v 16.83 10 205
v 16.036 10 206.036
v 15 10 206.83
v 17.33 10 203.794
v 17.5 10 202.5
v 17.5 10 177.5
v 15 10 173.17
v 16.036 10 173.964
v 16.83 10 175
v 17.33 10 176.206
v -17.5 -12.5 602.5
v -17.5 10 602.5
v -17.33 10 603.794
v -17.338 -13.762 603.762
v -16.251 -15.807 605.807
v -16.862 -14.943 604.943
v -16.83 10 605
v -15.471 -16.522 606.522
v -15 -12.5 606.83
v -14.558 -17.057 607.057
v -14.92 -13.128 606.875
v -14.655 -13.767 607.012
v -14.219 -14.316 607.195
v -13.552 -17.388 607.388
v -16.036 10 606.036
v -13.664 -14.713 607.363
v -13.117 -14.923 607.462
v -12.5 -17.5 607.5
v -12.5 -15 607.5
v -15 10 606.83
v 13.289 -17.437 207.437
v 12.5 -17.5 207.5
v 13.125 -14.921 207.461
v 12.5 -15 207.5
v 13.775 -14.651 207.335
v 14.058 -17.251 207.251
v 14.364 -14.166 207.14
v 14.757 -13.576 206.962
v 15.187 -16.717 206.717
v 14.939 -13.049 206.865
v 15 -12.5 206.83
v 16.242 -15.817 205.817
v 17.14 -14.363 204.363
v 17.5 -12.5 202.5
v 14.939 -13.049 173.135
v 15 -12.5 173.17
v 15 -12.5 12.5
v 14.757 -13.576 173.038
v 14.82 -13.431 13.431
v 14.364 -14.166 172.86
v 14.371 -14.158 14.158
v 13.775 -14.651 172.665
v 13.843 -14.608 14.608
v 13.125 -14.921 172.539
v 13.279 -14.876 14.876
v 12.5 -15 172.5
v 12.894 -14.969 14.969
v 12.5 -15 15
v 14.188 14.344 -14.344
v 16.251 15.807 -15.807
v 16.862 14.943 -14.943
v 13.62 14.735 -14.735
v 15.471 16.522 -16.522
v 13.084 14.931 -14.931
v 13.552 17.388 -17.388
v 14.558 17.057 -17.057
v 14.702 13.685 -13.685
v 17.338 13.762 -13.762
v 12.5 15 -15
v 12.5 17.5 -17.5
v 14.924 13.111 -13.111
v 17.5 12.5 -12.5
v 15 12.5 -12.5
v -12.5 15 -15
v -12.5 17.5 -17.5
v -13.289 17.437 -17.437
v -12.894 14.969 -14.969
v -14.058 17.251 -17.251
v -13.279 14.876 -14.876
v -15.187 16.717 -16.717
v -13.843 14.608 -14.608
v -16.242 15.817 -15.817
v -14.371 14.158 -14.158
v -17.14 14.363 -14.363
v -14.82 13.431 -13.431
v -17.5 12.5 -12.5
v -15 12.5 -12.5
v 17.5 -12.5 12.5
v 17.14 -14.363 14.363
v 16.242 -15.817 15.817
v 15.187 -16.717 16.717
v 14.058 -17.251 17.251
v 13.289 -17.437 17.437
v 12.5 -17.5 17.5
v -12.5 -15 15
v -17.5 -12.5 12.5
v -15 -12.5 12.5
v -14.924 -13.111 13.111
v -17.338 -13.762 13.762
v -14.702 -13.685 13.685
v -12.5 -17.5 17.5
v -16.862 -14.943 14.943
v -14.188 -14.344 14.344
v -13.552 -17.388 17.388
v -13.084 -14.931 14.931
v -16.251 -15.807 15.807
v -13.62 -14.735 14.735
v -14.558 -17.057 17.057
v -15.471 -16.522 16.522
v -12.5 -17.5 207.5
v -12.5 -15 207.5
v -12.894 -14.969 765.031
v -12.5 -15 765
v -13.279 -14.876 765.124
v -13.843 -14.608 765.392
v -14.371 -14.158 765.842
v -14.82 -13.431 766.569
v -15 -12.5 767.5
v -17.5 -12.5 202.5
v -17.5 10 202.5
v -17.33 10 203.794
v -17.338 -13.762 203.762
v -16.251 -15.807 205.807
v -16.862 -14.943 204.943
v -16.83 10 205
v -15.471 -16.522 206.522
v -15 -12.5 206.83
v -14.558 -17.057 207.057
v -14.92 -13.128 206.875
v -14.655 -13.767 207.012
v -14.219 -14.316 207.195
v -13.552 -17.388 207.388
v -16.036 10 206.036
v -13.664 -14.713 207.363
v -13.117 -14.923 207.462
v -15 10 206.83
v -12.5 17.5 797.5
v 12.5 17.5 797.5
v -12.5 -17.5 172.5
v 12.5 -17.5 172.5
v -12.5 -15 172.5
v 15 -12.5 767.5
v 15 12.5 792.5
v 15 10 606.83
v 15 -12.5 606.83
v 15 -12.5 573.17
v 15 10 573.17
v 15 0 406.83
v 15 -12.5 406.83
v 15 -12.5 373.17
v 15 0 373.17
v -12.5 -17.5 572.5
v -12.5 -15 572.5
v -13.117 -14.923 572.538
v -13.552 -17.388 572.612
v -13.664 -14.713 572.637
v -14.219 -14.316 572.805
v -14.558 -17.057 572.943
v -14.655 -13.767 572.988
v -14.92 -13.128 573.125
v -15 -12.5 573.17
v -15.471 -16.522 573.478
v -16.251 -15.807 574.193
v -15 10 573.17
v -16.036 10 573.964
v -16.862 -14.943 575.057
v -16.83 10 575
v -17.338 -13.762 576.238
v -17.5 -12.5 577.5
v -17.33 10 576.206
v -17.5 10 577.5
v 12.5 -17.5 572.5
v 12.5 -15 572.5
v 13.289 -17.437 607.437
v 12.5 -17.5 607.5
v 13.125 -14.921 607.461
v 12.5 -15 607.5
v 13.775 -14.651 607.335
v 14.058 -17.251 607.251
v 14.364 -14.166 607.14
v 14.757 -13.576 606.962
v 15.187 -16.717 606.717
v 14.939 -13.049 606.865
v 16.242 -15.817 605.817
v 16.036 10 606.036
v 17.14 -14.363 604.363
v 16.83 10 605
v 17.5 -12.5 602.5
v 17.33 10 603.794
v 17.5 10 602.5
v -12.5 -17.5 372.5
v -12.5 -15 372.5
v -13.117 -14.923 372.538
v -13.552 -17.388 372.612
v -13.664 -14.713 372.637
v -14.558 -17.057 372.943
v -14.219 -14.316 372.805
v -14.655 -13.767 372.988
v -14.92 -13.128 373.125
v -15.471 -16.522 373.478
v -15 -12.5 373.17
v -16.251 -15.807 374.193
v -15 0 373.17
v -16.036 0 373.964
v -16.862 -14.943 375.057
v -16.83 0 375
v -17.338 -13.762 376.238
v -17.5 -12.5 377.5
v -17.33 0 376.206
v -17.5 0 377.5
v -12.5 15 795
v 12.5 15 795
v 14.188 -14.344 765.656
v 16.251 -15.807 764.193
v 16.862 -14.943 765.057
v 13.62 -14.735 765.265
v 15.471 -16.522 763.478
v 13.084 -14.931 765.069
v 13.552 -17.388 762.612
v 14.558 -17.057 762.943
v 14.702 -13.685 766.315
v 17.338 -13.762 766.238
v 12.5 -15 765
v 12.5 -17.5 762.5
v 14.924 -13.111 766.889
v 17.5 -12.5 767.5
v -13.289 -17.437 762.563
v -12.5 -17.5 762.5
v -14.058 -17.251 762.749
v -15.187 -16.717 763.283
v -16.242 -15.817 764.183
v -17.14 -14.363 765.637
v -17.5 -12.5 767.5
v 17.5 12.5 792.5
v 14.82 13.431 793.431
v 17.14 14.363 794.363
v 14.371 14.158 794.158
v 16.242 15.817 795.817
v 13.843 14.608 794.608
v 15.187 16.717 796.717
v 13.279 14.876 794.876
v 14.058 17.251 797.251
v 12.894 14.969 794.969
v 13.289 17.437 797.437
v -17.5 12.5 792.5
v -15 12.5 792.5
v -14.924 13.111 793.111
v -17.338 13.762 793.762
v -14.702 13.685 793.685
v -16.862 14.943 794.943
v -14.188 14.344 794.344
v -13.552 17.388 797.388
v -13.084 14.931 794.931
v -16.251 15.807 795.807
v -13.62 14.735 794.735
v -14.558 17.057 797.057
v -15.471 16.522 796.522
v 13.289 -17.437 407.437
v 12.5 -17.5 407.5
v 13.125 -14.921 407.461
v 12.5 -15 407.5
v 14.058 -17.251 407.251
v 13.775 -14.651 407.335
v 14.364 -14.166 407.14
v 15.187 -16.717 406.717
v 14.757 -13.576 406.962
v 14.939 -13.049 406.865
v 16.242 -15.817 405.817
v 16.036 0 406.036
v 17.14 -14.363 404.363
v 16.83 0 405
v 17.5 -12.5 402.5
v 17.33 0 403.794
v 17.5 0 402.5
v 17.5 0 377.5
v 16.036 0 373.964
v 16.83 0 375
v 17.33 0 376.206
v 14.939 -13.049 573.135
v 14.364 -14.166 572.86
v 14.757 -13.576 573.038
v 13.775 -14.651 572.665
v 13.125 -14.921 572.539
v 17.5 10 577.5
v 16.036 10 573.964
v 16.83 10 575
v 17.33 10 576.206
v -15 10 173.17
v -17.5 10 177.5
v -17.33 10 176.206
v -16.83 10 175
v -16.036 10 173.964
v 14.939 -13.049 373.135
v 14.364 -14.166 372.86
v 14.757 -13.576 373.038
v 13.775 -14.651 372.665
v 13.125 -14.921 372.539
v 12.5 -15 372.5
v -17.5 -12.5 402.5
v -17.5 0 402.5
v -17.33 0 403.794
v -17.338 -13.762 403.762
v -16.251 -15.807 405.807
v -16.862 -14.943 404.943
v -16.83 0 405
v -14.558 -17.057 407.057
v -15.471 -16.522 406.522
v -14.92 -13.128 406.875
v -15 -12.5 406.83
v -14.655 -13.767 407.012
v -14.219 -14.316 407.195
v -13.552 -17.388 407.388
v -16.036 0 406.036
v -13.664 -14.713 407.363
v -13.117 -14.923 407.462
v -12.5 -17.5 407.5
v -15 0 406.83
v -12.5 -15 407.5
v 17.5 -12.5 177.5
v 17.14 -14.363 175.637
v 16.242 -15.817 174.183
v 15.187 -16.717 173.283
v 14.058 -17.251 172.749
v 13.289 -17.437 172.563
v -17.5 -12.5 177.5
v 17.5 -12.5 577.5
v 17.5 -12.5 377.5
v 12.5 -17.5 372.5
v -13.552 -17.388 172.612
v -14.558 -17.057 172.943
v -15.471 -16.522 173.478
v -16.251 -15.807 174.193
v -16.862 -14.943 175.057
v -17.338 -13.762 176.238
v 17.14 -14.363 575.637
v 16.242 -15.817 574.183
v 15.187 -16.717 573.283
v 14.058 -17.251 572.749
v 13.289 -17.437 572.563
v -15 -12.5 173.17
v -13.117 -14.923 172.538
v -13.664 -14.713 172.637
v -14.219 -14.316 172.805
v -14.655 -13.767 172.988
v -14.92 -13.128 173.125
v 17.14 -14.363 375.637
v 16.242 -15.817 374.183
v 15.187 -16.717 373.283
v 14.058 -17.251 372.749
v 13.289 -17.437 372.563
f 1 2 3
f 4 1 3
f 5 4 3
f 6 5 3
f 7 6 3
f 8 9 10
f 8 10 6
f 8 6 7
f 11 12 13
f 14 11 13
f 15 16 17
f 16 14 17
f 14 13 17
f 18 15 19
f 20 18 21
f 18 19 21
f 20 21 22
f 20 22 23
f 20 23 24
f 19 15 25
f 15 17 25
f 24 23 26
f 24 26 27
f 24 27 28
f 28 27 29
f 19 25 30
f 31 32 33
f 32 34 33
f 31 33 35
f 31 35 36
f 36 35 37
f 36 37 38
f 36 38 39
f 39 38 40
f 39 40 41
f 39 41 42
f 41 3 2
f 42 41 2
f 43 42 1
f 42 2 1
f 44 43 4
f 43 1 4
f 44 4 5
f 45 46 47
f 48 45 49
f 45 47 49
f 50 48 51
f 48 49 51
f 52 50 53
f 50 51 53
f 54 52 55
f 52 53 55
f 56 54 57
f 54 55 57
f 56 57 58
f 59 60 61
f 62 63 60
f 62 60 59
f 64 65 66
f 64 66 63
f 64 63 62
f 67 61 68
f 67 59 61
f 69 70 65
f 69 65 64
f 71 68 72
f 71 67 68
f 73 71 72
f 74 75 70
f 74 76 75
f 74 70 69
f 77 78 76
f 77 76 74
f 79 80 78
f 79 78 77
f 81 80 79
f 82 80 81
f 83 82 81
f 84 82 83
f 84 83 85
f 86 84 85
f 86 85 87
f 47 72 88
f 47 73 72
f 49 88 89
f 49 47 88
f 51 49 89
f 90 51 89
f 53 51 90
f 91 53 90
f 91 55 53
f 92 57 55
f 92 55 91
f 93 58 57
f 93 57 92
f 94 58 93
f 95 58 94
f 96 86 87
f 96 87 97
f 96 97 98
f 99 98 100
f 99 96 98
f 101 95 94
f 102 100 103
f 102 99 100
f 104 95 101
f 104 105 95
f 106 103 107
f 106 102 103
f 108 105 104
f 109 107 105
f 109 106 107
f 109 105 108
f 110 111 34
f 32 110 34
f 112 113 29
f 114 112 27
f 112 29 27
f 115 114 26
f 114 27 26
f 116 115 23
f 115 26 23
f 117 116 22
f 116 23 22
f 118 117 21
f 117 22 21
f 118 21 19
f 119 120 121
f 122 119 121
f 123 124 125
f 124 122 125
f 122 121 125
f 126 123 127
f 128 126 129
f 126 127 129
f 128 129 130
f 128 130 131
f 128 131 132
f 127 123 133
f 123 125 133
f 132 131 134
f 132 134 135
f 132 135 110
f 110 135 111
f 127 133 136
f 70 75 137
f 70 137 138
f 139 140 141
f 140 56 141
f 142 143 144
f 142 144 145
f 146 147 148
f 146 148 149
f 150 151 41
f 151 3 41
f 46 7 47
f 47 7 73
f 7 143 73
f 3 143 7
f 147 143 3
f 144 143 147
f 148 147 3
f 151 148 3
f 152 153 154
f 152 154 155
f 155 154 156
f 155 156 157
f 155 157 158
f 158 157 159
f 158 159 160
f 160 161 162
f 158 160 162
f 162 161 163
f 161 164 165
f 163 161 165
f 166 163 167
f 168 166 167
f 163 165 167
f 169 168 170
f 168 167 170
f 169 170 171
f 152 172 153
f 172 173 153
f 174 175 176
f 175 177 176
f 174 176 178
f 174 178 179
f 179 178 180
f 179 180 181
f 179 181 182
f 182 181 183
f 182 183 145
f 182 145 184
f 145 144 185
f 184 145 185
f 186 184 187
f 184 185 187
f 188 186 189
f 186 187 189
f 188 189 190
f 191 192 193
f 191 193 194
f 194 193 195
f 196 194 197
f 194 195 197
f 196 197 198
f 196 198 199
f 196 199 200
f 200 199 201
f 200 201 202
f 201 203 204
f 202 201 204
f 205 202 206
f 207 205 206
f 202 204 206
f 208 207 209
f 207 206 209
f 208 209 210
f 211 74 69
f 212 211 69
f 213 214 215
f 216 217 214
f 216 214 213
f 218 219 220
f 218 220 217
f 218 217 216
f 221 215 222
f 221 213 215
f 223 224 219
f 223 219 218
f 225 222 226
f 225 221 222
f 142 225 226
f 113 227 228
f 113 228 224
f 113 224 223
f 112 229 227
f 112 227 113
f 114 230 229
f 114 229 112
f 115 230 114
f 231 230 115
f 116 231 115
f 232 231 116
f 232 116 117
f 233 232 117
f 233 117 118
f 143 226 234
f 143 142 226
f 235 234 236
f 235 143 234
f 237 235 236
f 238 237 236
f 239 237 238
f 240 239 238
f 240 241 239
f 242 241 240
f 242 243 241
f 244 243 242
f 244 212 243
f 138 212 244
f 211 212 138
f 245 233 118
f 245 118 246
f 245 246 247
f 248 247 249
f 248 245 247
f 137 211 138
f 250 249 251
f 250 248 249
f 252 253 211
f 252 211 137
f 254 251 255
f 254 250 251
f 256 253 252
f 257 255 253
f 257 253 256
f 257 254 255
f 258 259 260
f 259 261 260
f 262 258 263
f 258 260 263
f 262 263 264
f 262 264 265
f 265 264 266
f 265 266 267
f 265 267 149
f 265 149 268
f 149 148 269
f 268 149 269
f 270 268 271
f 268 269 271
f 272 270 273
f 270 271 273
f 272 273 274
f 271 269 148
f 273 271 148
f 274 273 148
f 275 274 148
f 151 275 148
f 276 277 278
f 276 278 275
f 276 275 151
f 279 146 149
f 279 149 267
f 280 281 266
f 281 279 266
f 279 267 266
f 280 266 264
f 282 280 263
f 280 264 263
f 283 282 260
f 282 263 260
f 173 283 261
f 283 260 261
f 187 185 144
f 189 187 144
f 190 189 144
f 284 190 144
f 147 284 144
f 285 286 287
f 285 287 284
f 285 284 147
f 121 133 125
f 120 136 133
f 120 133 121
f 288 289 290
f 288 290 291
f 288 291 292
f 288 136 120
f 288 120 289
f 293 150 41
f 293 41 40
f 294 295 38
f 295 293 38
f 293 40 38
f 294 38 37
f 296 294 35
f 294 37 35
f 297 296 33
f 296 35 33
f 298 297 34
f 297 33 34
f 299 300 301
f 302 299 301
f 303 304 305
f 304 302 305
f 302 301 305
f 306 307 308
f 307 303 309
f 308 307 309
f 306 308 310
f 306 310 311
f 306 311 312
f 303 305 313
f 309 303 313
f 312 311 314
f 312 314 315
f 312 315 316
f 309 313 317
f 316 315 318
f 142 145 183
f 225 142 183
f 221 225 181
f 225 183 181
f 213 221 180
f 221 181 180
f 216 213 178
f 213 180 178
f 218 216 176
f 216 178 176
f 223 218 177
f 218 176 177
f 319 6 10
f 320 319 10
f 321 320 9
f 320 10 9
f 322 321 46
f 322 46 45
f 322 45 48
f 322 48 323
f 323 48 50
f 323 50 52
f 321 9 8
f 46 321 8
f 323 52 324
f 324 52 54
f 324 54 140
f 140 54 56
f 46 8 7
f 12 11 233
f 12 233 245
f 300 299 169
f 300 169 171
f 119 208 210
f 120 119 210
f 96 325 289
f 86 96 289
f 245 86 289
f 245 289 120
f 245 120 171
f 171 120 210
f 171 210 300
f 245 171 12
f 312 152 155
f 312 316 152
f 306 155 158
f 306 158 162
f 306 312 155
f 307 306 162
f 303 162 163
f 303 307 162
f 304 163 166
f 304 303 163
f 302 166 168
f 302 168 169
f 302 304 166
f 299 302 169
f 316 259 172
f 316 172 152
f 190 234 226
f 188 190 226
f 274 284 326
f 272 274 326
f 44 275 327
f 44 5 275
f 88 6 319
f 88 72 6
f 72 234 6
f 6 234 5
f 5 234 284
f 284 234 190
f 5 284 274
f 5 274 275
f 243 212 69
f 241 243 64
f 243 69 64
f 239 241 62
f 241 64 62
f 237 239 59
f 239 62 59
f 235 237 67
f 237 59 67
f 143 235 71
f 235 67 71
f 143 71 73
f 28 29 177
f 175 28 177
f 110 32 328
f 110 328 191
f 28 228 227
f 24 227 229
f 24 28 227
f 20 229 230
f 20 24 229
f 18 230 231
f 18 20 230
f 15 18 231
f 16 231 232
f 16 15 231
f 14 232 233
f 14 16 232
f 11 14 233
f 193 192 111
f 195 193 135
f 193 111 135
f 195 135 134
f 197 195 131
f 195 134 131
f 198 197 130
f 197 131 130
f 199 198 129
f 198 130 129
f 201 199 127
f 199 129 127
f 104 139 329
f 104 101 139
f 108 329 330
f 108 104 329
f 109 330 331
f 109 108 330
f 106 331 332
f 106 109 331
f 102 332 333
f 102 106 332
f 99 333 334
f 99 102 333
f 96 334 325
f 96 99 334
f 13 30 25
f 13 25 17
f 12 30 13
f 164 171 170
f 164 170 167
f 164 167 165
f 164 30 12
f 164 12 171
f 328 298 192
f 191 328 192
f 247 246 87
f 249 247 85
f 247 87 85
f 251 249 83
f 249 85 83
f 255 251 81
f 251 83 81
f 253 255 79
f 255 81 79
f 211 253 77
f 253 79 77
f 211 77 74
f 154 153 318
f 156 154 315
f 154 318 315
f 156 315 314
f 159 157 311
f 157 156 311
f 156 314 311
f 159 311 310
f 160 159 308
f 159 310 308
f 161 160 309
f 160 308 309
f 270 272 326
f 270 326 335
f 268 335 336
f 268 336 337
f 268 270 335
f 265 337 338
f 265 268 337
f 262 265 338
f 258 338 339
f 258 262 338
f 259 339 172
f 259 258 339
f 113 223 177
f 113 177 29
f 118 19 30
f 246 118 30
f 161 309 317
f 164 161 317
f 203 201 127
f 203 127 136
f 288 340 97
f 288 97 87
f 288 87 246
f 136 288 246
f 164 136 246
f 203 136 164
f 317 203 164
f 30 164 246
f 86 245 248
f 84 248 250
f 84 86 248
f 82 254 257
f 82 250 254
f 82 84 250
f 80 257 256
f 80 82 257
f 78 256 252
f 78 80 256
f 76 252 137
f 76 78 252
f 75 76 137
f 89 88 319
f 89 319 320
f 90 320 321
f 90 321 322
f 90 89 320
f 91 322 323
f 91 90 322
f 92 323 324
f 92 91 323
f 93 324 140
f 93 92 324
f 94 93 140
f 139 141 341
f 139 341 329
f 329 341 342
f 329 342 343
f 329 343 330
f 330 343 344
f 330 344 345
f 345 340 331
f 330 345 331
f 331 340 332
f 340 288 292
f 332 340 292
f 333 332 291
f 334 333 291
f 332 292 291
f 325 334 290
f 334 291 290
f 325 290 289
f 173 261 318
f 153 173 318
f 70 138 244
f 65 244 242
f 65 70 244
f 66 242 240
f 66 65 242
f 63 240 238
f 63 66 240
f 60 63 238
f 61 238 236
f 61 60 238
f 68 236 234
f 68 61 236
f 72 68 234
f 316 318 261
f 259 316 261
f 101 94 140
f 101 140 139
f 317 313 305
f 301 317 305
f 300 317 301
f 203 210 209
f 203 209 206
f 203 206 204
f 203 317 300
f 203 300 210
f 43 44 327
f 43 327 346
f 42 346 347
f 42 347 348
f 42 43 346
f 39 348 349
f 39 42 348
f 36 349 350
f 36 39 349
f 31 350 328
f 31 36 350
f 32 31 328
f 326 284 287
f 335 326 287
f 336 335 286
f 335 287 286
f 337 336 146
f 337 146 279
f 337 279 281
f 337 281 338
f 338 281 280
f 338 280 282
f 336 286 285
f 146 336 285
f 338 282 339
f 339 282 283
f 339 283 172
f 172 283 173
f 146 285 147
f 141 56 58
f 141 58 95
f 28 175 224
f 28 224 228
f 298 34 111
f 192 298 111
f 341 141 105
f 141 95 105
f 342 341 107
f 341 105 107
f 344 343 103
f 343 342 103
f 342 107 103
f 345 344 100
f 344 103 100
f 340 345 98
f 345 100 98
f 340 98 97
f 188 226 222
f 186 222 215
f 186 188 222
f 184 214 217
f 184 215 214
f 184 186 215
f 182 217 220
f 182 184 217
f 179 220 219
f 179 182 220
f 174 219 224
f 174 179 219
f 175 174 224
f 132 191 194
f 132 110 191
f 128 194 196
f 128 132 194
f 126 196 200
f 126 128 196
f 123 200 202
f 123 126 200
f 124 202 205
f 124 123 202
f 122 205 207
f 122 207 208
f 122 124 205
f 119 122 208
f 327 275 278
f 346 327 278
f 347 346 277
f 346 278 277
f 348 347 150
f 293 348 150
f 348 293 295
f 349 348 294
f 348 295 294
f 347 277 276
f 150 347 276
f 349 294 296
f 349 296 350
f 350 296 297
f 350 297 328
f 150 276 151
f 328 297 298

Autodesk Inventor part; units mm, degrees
ref_plane "Start plane" through (0, 0, -17.5) normal (0, 0, 1) x (1, 0, 0)
ref_plane "End plane" through (0, 0, 797.5) normal (0, 0, 1) x (1, 0, 0)
sketch "Sketch" plane through (0, 0, 0) normal (0, 0, 1) x (1, 0, 0)
  line L0 (-17.5, -12.5) -> (-17.5, 12.5)
  line L1 (-12.5, 17.5) -> (12.5, 17.5)
  line L2 (17.5, 12.5) -> (17.5, -12.5)
  line L3 (12.5, -17.5) -> (-12.5, -17.5)
  arc A0 (-17.5, -12.5) -> (-12.5, -17.5) centre (-12.5, -12.5) ccw
  arc A1 (-12.5, 17.5) -> (-17.5, 12.5) centre (-12.5, 12.5) ccw
  arc A2 (17.5, 12.5) -> (12.5, 17.5) centre (12.5, 12.5) ccw
  arc A3 (12.5, -17.5) -> (17.5, -12.5) centre (12.5, -12.5) ccw
  arc A4 (-12.5, 15) -> (-15, 12.5) centre (-12.5, 12.5) ccw
  line L4 (-12.5, 15) -> (12.5, 15)
  arc A5 (15, 12.5) -> (12.5, 15) centre (12.5, 12.5) ccw
  line L5 (15, 12.5) -> (15, -12.5)
  arc A6 (12.5, -15) -> (15, -12.5) centre (12.5, -12.5) ccw
  line L6 (12.5, -15) -> (-12.5, -15)
  arc A7 (-15, -12.5) -> (-12.5, -15) centre (-12.5, -12.5) ccw
  line L7 (-15, -12.5) -> (-15, 12.5)
  line L8 (0, 25.9497) -> (0, -25.9497) construction
  line L9 (-25.9497, 0) -> (25.9497, 0) construction
  dimension "d7" = 5
  dimension "d10" = 35
  dimension "d11" = 35
  dimension "d12" = 2.5
  dimension "d15" = 17.5
  dimension "d16" = 17.5
extrude "Body" add sketch "Sketch" along normal up to surface (815 mm away) from surface at -17.5
sketch "Sketch3" plane through (0, 0, 0) normal (0, 0, 1) x (1, 0, 0)
  line L0 (0, 0) -> (10, 0)
ref_plane "Work Plane3" through (0, 0, 0) normal (0, -1, 0) x (1, 0, 0)
sketch "Sketch4" plane through (0, 0, 0) normal (0, -1, 0) x (1, 0, 0)
  line L0 (-2, -17.5) -> (12, -17.5)
  line L1 (-2, 797.5) -> (12, 797.5)
  dimension "d18" = 815
ref_plane "Work Plane4" through (107.5, 0, -17.5) normal (0, 0, -1) x (-1, 0, 0)
split "Split1" plane through (107.5, 0, -17.5) removes the side toward (0, 0, -1)
ref_plane "Work Plane5" through (17.5, 0, 797.5) normal (0, 0, 1) x (1, 0, 0)
split "Split2" plane through (17.5, 0, 797.5) removes the side toward (0, 0, 1)
ref_plane "Work Plane6" through (0, 17.5, -17.5) normal (0, -0.7071, -0.7071) x (1, 0, 0)
split "Split3" plane through (0, 17.5, -17.5) removes the side toward (0, -0.7071, -0.7071)
ref_plane "Work Plane14" through (0, 17.5, 797.5) normal (0, -0.7071, 0.7071) x (1, 0, 0)
split "Split5" plane through (0, 17.5, 797.5) removes the side toward (0, -0.7071, 0.7071)
ref_plane "Work Plane17" through (0, 10, 190) normal (0, -1, 0) x (0, 0, -1)
ref_plane "Work Plane18" through (0, -490, 190) normal (0, -1, 0) x (0, 0, -1)
ref_plane "Work Plane19" through (0, -240, 190) normal (0, -1, 0) x (0, 0, -1)
ref_plane "Work Plane20" through (0, 0, 390) normal (0, -1, 0) x (0, 0, -1)
ref_plane "Work Plane21" through (0, -480, 390) normal (0, -1, 0) x (0, 0, -1)
ref_plane "Work Plane22" through (0, -240, 390) normal (0, -1, 0) x (0, 0, -1)
ref_plane "Work Plane23" through (0, 10, 590) normal (0, -1, 0) x (0, 0, -1)
ref_plane "Work Plane24" through (0, -490, 590) normal (0, -1, 0) x (0, 0, -1)
ref_plane "Work Plane25" through (0, -240, 590) normal (0, -1, 0) x (0, 0, -1)
sketch "Sketch17" plane through (0, -240, 190) normal (0, -1, 0) x (0, 0, -1)
  arc A0 (-17.5, -12.5) -> (-12.5, -17.5) centre (-12.5, -12.5) ccw
  line L0 (-17.5, -12.5) -> (-17.5, 12.5)
  arc A1 (-12.5, 17.5) -> (-17.5, 12.5) centre (-12.5, 12.5) ccw
  line L1 (-12.5, 17.5) -> (12.5, 17.5)
  arc A2 (17.5, 12.5) -> (12.5, 17.5) centre (12.5, 12.5) ccw
  line L2 (17.5, 12.5) -> (17.5, -12.5)
  arc A3 (12.5, -17.5) -> (17.5, -12.5) centre (12.5, -12.5) ccw
  line L3 (12.5, -17.5) -> (-12.5, -17.5)
  arc A4 (-12.5, 15) -> (-15, 12.5) centre (-12.5, 12.5) ccw
  line L4 (-12.5, 15) -> (12.5, 15)
  arc A5 (15, 12.5) -> (12.5, 15) centre (12.5, 12.5) ccw
  line L5 (15, 12.5) -> (15, -12.5)
  arc A6 (12.5, -15) -> (15, -12.5) centre (12.5, -12.5) ccw
  line L6 (12.5, -15) -> (-12.5, -15)
  arc A7 (-15, -12.5) -> (-12.5, -15) centre (-12.5, -12.5) ccw
  line L7 (-15, -12.5) -> (-15, 12.5)
extrude "Extrusion14" cut sketch "Sketch17" along normal up to surface (500 mm away) from surface at -250 contours L0 A1 L1 A2 L2 A3 L3 A0 | L4 A5 L5 A6 L6 A7 L7 A4
sketch "Sketch18" plane through (0, -240, 390) normal (0, -1, 0) x (0, 0, -1)
  arc A0 (-17.5, -12.5) -> (-12.5, -17.5) centre (-12.5, -12.5) ccw
  line L0 (-17.5, -12.5) -> (-17.5, 12.5)
  arc A1 (-12.5, 17.5) -> (-17.5, 12.5) centre (-12.5, 12.5) ccw
  line L1 (-12.5, 17.5) -> (12.5, 17.5)
  arc A2 (17.5, 12.5) -> (12.5, 17.5) centre (12.5, 12.5) ccw
  line L2 (17.5, 12.5) -> (17.5, -12.5)
  arc A3 (12.5, -17.5) -> (17.5, -12.5) centre (12.5, -12.5) ccw
  line L3 (12.5, -17.5) -> (-12.5, -17.5)
  arc A4 (-12.5, 15) -> (-15, 12.5) centre (-12.5, 12.5) ccw
  line L4 (-12.5, 15) -> (12.5, 15)
  arc A5 (15, 12.5) -> (12.5, 15) centre (12.5, 12.5) ccw
  line L5 (15, 12.5) -> (15, -12.5)
  arc A6 (12.5, -15) -> (15, -12.5) centre (12.5, -12.5) ccw
  line L6 (12.5, -15) -> (-12.5, -15)
  arc A7 (-15, -12.5) -> (-12.5, -15) centre (-12.5, -12.5) ccw
  line L7 (-15, -12.5) -> (-15, 12.5)
extrude "Extrusion15" cut sketch "Sketch18" along normal up to surface (480 mm away) from surface at -240 contours L0 A1 L1 A2 L2 A3 L3 A0 | L4 A5 L5 A6 L6 A7 L7 A4
sketch "Sketch19" plane through (0, -240, 590) normal (0, -1, 0) x (0, 0, -1)
  arc A0 (-17.5, -12.5) -> (-12.5, -17.5) centre (-12.5, -12.5) ccw
  line L0 (-17.5, -12.5) -> (-17.5, 12.5)
  arc A1 (-12.5, 17.5) -> (-17.5, 12.5) centre (-12.5, 12.5) ccw
  line L1 (-12.5, 17.5) -> (12.5, 17.5)
  arc A2 (17.5, 12.5) -> (12.5, 17.5) centre (12.5, 12.5) ccw
  line L2 (17.5, 12.5) -> (17.5, -12.5)
  arc A3 (12.5, -17.5) -> (17.5, -12.5) centre (12.5, -12.5) ccw
  line L3 (12.5, -17.5) -> (-12.5, -17.5)
  arc A4 (-12.5, 15) -> (-15, 12.5) centre (-12.5, 12.5) ccw
  line L4 (-12.5, 15) -> (12.5, 15)
  arc A5 (15, 12.5) -> (12.5, 15) centre (12.5, 12.5) ccw
  line L5 (15, 12.5) -> (15, -12.5)
  arc A6 (12.5, -15) -> (15, -12.5) centre (12.5, -12.5) ccw
  line L6 (12.5, -15) -> (-12.5, -15)
  arc A7 (-15, -12.5) -> (-12.5, -15) centre (-12.5, -12.5) ccw
  line L7 (-15, -12.5) -> (-15, 12.5)
extrude "Extrusion16" cut sketch "Sketch19" along normal up to surface (500 mm away) from surface at -250 contours L0 A1 L1 A2 L2 A3 L3 A0 | L4 A5 L5 A6 L6 A7 L7 A4
equation "\"d7\" = G_IR"
equation "\"d10\" = G_H"
equation "\"d11\" = G_W"
equation "\"d12\" = G_T"
equation "\"d15\" = 0.5 * d10"
equation "\"d16\" = 0.5 * d11"
equation "\"d3\" = G_L"
equation "\"G_W\" = 35"
equation "\"G_H\" = 35"
equation "\"G_T\" = 2.5"
equation "\"G_IR\" = 5"
equation "\"G_L\" = 835"
equation "\"G_OFFSET_START\" = 17.5"
equation "\"G_OFFSET_END\" = 17.5"
equation "\"d13\" = -G_OFFSET_START"
equation "\"d14\" = G_OFFSET_END + B_L"
equation "\"B_L\" = 780"
properties part number "AS 1163 - C350L0 35x35x2.5 SHS - 835" material "Steel, Mild"
